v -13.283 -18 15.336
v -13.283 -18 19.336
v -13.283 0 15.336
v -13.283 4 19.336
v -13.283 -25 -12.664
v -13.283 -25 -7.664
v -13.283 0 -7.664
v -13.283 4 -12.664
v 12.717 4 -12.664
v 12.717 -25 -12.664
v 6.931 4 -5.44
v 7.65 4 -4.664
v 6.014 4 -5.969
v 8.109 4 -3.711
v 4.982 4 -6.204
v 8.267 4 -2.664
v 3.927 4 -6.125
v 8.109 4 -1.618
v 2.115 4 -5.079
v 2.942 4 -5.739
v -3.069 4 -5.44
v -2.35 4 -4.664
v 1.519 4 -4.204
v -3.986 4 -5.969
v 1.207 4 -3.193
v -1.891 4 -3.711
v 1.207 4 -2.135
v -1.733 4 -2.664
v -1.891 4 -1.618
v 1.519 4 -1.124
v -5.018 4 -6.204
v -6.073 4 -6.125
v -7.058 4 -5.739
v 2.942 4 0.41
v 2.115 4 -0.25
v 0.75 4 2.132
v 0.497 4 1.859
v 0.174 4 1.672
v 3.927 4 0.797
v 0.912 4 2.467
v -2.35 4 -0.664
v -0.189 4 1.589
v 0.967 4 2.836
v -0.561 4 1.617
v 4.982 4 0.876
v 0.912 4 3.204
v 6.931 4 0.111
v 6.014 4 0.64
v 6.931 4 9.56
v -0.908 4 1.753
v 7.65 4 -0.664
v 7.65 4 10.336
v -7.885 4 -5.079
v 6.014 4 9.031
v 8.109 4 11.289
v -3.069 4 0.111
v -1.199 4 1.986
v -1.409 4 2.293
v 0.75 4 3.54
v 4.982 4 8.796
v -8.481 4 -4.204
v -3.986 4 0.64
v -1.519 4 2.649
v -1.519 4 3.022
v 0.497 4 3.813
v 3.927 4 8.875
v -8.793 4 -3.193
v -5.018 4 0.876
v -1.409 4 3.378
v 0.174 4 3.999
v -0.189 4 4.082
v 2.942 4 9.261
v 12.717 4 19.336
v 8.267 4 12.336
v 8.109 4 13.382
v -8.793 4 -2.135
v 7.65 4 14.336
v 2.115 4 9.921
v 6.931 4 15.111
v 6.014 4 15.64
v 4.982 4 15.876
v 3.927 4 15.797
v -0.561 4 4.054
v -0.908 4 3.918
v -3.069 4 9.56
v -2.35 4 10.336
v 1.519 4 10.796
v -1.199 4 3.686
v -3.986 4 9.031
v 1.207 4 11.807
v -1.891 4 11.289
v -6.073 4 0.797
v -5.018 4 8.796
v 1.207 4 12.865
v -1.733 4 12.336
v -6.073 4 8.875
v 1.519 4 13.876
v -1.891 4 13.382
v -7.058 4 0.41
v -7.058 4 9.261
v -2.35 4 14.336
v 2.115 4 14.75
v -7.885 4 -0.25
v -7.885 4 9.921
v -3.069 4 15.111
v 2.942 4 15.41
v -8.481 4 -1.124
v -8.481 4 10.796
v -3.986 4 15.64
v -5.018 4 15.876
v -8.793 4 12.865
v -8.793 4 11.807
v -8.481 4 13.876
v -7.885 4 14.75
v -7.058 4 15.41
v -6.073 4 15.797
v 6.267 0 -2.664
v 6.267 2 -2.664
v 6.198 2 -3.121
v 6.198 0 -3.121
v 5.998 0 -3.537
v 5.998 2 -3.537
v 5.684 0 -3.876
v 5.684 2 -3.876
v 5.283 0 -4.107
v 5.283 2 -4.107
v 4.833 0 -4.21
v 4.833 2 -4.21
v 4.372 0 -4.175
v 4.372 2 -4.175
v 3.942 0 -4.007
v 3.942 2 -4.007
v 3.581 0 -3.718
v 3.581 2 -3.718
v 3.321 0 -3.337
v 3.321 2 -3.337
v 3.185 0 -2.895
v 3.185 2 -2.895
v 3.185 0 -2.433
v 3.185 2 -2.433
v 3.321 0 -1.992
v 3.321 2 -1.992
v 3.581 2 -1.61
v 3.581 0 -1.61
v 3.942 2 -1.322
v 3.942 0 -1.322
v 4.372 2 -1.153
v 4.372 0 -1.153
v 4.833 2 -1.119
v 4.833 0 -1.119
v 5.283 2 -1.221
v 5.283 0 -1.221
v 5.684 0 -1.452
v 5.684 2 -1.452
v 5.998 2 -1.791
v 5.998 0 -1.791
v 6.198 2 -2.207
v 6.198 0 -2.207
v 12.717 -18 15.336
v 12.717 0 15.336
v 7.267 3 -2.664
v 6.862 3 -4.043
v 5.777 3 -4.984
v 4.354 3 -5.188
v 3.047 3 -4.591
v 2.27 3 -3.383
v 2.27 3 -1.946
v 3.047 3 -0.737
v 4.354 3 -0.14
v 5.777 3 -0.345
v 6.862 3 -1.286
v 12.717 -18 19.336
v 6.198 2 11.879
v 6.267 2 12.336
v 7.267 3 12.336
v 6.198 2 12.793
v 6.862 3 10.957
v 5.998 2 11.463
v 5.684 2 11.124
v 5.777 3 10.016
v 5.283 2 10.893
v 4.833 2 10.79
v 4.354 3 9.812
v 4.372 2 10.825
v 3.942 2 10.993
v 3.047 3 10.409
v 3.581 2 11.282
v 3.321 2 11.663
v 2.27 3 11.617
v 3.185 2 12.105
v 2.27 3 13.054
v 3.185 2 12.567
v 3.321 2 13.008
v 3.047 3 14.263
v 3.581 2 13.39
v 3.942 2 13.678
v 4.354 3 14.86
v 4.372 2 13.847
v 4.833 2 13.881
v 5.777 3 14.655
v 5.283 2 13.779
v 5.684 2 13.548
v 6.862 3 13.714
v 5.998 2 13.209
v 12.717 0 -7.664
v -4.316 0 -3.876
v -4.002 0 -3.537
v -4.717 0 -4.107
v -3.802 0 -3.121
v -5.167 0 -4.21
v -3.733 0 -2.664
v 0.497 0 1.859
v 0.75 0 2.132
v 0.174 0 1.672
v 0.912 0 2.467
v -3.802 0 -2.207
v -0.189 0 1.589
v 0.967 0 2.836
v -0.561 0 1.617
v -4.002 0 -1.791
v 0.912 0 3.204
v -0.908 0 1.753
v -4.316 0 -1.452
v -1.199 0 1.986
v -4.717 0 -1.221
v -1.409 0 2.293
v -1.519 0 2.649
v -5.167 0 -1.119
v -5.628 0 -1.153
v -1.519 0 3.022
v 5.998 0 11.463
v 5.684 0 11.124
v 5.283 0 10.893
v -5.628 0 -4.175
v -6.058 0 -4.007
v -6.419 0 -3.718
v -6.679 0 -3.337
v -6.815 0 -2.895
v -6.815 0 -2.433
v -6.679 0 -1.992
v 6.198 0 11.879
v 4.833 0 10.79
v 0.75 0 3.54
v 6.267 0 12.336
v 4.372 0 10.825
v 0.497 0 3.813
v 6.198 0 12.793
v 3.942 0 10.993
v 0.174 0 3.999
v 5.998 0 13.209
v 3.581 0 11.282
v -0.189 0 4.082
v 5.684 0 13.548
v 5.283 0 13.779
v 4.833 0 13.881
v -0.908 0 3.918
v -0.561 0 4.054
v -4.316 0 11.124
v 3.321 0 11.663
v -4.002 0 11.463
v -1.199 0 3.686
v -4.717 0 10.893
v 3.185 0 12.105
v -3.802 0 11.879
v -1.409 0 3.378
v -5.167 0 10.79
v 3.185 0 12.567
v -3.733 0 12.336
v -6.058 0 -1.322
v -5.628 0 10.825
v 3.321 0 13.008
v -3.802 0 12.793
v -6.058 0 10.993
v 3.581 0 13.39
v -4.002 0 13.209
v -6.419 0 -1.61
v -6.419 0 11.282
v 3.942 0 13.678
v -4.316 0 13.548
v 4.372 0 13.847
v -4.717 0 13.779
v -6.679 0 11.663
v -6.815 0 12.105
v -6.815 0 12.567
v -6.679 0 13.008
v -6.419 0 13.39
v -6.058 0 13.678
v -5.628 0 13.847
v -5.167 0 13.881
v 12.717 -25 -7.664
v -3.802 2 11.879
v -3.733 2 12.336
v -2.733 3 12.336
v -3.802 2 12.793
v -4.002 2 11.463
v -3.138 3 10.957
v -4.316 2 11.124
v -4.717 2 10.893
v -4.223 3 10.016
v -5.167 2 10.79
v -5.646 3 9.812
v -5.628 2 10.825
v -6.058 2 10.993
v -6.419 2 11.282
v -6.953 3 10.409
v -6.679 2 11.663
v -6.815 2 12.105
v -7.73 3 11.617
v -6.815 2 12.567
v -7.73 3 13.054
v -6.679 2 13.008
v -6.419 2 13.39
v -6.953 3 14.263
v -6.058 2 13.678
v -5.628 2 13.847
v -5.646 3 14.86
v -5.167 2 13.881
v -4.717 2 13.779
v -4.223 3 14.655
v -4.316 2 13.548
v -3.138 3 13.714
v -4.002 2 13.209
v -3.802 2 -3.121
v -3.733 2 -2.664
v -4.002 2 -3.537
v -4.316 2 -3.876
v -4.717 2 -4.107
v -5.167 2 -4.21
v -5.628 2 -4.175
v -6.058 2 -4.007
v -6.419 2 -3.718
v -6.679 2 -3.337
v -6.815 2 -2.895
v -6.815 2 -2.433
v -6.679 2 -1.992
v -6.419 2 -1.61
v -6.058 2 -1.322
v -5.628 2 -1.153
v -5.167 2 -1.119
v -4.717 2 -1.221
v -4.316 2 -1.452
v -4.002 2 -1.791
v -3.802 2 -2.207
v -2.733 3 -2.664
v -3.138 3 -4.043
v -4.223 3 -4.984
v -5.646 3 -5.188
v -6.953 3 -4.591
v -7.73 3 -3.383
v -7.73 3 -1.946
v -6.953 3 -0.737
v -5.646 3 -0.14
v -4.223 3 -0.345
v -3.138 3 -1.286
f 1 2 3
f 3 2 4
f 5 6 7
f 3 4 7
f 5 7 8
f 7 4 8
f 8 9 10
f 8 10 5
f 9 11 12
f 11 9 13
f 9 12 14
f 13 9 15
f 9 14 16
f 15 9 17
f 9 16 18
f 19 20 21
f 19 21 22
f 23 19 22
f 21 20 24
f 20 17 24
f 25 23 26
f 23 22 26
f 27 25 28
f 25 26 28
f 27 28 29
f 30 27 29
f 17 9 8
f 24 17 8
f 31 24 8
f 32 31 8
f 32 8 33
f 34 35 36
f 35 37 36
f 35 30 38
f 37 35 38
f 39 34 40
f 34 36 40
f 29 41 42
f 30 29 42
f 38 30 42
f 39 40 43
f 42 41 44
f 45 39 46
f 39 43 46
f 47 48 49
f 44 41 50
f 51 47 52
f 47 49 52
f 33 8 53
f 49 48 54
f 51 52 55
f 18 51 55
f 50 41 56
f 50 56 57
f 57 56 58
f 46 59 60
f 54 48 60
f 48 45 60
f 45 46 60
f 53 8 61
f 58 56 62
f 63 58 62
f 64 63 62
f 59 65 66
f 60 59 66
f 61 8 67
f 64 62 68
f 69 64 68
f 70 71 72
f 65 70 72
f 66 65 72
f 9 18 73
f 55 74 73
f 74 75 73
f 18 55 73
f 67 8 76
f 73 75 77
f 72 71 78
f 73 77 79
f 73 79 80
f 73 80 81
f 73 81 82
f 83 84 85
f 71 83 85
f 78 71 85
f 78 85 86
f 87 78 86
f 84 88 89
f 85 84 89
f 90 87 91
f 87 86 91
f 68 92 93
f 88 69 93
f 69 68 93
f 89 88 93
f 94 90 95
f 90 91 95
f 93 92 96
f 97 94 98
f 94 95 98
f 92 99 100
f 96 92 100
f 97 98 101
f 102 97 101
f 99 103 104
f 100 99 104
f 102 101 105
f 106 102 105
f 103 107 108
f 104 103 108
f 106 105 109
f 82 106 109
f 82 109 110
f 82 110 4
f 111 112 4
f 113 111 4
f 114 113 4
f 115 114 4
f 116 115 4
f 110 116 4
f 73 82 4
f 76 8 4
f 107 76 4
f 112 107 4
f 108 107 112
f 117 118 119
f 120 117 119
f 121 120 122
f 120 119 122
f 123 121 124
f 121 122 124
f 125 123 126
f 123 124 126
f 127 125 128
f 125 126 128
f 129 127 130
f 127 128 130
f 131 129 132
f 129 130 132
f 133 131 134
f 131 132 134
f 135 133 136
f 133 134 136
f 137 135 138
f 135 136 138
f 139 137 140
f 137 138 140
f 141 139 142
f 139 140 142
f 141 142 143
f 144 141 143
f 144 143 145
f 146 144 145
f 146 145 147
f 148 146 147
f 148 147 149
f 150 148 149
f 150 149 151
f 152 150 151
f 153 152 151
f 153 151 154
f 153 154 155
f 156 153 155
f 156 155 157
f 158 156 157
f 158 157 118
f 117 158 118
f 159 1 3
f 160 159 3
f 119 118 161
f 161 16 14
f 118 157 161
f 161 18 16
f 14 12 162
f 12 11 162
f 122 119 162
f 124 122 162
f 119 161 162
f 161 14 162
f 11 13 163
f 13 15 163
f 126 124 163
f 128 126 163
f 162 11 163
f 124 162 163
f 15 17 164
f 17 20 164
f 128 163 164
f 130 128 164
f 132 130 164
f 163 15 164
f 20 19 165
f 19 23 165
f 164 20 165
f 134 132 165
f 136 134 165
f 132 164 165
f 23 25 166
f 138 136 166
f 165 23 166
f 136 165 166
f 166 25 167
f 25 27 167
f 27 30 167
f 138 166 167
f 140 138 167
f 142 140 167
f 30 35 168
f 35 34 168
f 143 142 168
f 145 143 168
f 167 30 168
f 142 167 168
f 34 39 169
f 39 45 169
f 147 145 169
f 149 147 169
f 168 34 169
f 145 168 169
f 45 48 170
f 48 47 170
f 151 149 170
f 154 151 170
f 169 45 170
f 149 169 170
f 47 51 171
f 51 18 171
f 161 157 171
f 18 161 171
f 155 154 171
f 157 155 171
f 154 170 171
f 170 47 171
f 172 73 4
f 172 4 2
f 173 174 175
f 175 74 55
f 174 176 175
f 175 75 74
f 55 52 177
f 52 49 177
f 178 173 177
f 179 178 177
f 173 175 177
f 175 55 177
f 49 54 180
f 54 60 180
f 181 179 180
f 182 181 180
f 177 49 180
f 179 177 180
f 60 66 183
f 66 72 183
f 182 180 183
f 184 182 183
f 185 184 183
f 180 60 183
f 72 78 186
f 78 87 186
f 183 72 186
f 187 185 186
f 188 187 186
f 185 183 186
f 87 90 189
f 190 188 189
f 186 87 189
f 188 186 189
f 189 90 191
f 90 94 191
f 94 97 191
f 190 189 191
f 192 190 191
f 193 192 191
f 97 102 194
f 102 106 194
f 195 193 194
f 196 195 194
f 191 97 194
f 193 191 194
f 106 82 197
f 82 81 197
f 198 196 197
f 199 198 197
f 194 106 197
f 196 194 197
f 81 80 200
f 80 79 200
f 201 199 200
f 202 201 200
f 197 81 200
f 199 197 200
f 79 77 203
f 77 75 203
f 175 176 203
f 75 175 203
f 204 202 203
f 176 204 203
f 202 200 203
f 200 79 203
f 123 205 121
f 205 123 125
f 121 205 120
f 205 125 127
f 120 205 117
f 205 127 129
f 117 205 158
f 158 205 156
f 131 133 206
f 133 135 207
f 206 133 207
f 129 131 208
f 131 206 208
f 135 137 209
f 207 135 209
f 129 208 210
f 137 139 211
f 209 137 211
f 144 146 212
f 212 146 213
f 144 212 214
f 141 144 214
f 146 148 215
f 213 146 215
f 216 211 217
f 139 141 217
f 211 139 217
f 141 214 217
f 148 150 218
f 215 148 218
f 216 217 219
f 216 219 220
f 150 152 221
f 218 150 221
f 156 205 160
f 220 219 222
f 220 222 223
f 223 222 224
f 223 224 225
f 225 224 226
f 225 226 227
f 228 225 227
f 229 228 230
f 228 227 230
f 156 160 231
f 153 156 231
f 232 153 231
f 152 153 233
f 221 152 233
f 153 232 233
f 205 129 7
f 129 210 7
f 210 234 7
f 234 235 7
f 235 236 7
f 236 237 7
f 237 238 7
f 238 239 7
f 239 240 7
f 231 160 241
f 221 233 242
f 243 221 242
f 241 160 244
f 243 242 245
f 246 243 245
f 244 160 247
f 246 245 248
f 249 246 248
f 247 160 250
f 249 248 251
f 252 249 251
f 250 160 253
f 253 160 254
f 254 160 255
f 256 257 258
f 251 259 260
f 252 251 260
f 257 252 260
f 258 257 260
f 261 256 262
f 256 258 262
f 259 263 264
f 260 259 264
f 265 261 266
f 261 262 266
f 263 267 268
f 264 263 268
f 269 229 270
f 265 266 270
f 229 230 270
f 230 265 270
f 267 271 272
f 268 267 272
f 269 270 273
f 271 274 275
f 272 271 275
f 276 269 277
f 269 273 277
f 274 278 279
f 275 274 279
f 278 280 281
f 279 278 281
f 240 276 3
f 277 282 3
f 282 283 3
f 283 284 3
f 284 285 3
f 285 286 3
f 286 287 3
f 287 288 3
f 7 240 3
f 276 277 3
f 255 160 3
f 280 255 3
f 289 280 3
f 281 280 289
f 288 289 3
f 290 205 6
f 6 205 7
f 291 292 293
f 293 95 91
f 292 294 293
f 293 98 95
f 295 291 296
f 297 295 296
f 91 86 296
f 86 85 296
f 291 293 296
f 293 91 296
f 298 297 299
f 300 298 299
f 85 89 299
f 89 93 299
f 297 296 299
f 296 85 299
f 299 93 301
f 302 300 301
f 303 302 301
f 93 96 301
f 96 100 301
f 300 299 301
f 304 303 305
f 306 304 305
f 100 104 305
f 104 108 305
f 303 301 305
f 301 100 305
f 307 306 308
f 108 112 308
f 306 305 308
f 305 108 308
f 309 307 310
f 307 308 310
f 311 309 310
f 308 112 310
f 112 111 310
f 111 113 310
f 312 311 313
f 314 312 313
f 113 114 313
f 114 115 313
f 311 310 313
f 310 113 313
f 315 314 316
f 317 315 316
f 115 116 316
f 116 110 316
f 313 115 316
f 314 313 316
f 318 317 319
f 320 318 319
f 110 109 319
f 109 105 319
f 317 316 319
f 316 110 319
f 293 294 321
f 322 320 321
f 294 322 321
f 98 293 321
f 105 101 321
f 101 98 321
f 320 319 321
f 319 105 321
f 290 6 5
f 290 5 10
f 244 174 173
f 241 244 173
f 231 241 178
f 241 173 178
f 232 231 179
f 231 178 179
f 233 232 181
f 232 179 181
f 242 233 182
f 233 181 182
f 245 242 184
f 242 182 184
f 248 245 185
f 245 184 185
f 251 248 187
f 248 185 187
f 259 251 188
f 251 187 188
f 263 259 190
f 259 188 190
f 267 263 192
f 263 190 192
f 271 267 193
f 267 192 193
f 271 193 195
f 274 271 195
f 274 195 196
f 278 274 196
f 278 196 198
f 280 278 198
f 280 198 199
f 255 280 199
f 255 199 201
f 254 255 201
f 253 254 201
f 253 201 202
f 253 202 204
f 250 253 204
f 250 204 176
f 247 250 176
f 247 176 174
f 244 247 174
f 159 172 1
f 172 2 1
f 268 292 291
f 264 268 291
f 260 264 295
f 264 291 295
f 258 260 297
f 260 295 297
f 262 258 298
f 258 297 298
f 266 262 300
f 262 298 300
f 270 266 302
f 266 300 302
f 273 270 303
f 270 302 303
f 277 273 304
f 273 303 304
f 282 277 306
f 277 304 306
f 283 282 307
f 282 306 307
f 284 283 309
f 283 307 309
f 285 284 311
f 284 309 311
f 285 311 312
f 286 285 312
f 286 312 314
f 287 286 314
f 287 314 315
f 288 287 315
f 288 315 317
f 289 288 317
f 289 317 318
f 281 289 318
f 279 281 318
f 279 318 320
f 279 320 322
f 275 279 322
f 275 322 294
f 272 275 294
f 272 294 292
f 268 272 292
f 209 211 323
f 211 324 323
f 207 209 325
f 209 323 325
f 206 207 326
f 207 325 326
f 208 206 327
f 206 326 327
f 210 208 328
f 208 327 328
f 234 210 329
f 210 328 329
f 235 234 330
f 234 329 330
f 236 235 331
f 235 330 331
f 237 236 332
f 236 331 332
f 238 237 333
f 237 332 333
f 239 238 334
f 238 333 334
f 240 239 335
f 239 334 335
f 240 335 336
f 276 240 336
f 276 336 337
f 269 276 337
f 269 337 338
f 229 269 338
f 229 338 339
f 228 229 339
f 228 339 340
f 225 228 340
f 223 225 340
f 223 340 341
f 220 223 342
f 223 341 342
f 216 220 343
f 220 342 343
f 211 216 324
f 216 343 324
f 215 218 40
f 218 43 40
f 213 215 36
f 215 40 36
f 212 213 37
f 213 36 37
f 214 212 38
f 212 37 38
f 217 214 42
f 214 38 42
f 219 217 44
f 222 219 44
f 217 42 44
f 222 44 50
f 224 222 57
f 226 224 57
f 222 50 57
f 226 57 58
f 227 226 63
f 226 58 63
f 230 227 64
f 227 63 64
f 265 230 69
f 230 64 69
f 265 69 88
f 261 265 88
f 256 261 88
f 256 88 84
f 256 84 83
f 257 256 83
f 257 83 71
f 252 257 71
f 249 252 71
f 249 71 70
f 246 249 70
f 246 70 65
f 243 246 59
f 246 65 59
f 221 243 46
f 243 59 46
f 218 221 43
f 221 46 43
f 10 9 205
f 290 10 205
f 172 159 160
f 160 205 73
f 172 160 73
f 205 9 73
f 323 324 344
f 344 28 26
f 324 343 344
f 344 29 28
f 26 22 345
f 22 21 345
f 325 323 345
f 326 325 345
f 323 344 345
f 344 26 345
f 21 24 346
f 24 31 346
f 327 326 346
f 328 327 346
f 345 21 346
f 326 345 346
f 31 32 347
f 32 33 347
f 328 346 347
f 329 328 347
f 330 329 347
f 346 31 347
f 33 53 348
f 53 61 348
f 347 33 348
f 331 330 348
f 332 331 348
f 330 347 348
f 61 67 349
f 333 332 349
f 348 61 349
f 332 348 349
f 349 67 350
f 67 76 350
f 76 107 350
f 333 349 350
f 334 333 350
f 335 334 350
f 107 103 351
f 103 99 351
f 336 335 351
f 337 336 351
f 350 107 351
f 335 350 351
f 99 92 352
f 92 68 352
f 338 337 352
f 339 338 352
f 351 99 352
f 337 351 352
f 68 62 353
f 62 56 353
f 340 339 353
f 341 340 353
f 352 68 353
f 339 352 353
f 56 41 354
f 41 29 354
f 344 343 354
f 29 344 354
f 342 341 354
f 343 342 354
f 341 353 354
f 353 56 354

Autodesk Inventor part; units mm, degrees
ref_plane "YZ Plane" through (0, 0, 0) normal (1, 0, 0) x (0, 1, 0)
ref_plane "XZ Plane" through (0, 0, 0) normal (0, 1, 0) x (-1, 0, 0)
ref_plane "XY Plane" through (0, 0, 0) normal (0, 0, 1) x (1, 0, 0)
sketch "Sketch1" plane through (0, 0, 0) normal (0, 1, 0) x (-1, 0, 0)
  line L0 (13.2828, -12.6642) -> (-12.7172, -12.6642)
  line L1 (-12.7172, -12.6642) -> (-12.7172, 17.3358)
  line L2 (-12.7172, 17.3358) -> (13.2828, 17.3358)
  line L3 (13.2828, 17.3358) -> (13.2828, -12.6642)
  point P0 (0, 0)
  dimension "d0" = 26
  dimension "d1" = 30
extrude "Extrusion1" add sketch "Sketch1" along normal blind 4
sketch "Sketch2" plane through (0, 4, 0) normal (0, 1, 0) x (1, 0, 0)
  circle A0 centre (-5.2828, 2.6642) radius 1.55
  circle A1 centre (4.7172, 2.6642) radius 1.55
  circle A2 centre (-5.2828, -12.3358) radius 1.55
  circle A3 centre (4.7172, -12.3358) radius 1.55
  line L0 (-13.2828, -17.3358) -> (12.7172, -17.3358) projected
  line L1 (-13.2828, 12.6642) -> (-13.2828, -17.3358) projected
  point P0 (0, 0)
  dimension "d4" = 3.1
  dimension "d5" = 3.1
  dimension "d6" = 3.1
  dimension "d7" = 3.1
  dimension "d8" = 10
  dimension "d9" = 10
  dimension "d10" = 15
  dimension "d11" = 15
  dimension "d12" = 5
  dimension "d13" = 5
  dimension "d14" = 8
  dimension "d15" = 8
extrude "Extrusion2" cut sketch "Sketch2" against normal through all
sketch "Sketch3" plane through (0, 0, 0) normal (0, -1, 0) x (1, 0, 0)
  point P0 (0, 0)
sketch "Sketch4" plane through (-13.2828, 0, -12.6642) normal (-1, 0, 0) x (0, 0, 1)
  line L0 (30, 4) -> (0, 4) projected
  line L1 (28, 4) -> (32, 4)
  line L2 (32, 4) -> (32, -18)
  line L3 (32, -18) -> (28, -18)
  line L4 (28, -18) -> (28, 4)
  line L5 (30, 0) -> (30, 4) projected
  point P0 (12.6642, 0)
  dimension "d18" = 2
  dimension "d19" = 4
  dimension "d20" = 22
extrude "Extrusion3" add sketch "Sketch4" against normal up to surface (26 mm away)
chamfer "Chamfer1" distance 2 angle 45 4 edges at (-6.8328, 4, 12.3358) (3.1672, 4, 12.3358) (-6.8328, 4, -2.6642) (3.1672, 4, -2.6642)
sketch "Sketch5" plane through (0, 4, 0) normal (0, 1, 0) x (1, 0, 0)
  circle A0 centre (-0.2828, -2.8358) radius 1.25
  line L0 (12.7172, 12.6642) -> (-13.2828, 12.6642) projected
  line L1 (-13.2828, 12.6642) -> (-13.2828, -19.3358) projected
  point P0 (0, 0)
  dimension "d26" = 2.5
  dimension "d27" = 15.5
  dimension "d28" = 13
extrude "Extrusion4" cut sketch "Sketch5" against normal through all
sketch "Sketch6" plane through (0, 0, 0) normal (0, -1, 0) x (1, 0, 0)
  line L0 (12.7172, -12.6642) -> (-13.2828, -12.6642) projected
  line L1 (-13.2828, -12.6642) -> (12.7172, -12.6642)
  line L2 (12.7172, -12.6642) -> (12.7172, -7.6642)
  line L3 (12.7172, -7.6642) -> (-13.2828, -7.6642)
  line L4 (-13.2828, -7.6642) -> (-13.2828, -12.6642)
  point P0 (0, 0)
  dimension "d31" = 5
extrude "Extrusion5" add sketch "Sketch6" along normal blind 25
properties part number "grantry_holder_R"
